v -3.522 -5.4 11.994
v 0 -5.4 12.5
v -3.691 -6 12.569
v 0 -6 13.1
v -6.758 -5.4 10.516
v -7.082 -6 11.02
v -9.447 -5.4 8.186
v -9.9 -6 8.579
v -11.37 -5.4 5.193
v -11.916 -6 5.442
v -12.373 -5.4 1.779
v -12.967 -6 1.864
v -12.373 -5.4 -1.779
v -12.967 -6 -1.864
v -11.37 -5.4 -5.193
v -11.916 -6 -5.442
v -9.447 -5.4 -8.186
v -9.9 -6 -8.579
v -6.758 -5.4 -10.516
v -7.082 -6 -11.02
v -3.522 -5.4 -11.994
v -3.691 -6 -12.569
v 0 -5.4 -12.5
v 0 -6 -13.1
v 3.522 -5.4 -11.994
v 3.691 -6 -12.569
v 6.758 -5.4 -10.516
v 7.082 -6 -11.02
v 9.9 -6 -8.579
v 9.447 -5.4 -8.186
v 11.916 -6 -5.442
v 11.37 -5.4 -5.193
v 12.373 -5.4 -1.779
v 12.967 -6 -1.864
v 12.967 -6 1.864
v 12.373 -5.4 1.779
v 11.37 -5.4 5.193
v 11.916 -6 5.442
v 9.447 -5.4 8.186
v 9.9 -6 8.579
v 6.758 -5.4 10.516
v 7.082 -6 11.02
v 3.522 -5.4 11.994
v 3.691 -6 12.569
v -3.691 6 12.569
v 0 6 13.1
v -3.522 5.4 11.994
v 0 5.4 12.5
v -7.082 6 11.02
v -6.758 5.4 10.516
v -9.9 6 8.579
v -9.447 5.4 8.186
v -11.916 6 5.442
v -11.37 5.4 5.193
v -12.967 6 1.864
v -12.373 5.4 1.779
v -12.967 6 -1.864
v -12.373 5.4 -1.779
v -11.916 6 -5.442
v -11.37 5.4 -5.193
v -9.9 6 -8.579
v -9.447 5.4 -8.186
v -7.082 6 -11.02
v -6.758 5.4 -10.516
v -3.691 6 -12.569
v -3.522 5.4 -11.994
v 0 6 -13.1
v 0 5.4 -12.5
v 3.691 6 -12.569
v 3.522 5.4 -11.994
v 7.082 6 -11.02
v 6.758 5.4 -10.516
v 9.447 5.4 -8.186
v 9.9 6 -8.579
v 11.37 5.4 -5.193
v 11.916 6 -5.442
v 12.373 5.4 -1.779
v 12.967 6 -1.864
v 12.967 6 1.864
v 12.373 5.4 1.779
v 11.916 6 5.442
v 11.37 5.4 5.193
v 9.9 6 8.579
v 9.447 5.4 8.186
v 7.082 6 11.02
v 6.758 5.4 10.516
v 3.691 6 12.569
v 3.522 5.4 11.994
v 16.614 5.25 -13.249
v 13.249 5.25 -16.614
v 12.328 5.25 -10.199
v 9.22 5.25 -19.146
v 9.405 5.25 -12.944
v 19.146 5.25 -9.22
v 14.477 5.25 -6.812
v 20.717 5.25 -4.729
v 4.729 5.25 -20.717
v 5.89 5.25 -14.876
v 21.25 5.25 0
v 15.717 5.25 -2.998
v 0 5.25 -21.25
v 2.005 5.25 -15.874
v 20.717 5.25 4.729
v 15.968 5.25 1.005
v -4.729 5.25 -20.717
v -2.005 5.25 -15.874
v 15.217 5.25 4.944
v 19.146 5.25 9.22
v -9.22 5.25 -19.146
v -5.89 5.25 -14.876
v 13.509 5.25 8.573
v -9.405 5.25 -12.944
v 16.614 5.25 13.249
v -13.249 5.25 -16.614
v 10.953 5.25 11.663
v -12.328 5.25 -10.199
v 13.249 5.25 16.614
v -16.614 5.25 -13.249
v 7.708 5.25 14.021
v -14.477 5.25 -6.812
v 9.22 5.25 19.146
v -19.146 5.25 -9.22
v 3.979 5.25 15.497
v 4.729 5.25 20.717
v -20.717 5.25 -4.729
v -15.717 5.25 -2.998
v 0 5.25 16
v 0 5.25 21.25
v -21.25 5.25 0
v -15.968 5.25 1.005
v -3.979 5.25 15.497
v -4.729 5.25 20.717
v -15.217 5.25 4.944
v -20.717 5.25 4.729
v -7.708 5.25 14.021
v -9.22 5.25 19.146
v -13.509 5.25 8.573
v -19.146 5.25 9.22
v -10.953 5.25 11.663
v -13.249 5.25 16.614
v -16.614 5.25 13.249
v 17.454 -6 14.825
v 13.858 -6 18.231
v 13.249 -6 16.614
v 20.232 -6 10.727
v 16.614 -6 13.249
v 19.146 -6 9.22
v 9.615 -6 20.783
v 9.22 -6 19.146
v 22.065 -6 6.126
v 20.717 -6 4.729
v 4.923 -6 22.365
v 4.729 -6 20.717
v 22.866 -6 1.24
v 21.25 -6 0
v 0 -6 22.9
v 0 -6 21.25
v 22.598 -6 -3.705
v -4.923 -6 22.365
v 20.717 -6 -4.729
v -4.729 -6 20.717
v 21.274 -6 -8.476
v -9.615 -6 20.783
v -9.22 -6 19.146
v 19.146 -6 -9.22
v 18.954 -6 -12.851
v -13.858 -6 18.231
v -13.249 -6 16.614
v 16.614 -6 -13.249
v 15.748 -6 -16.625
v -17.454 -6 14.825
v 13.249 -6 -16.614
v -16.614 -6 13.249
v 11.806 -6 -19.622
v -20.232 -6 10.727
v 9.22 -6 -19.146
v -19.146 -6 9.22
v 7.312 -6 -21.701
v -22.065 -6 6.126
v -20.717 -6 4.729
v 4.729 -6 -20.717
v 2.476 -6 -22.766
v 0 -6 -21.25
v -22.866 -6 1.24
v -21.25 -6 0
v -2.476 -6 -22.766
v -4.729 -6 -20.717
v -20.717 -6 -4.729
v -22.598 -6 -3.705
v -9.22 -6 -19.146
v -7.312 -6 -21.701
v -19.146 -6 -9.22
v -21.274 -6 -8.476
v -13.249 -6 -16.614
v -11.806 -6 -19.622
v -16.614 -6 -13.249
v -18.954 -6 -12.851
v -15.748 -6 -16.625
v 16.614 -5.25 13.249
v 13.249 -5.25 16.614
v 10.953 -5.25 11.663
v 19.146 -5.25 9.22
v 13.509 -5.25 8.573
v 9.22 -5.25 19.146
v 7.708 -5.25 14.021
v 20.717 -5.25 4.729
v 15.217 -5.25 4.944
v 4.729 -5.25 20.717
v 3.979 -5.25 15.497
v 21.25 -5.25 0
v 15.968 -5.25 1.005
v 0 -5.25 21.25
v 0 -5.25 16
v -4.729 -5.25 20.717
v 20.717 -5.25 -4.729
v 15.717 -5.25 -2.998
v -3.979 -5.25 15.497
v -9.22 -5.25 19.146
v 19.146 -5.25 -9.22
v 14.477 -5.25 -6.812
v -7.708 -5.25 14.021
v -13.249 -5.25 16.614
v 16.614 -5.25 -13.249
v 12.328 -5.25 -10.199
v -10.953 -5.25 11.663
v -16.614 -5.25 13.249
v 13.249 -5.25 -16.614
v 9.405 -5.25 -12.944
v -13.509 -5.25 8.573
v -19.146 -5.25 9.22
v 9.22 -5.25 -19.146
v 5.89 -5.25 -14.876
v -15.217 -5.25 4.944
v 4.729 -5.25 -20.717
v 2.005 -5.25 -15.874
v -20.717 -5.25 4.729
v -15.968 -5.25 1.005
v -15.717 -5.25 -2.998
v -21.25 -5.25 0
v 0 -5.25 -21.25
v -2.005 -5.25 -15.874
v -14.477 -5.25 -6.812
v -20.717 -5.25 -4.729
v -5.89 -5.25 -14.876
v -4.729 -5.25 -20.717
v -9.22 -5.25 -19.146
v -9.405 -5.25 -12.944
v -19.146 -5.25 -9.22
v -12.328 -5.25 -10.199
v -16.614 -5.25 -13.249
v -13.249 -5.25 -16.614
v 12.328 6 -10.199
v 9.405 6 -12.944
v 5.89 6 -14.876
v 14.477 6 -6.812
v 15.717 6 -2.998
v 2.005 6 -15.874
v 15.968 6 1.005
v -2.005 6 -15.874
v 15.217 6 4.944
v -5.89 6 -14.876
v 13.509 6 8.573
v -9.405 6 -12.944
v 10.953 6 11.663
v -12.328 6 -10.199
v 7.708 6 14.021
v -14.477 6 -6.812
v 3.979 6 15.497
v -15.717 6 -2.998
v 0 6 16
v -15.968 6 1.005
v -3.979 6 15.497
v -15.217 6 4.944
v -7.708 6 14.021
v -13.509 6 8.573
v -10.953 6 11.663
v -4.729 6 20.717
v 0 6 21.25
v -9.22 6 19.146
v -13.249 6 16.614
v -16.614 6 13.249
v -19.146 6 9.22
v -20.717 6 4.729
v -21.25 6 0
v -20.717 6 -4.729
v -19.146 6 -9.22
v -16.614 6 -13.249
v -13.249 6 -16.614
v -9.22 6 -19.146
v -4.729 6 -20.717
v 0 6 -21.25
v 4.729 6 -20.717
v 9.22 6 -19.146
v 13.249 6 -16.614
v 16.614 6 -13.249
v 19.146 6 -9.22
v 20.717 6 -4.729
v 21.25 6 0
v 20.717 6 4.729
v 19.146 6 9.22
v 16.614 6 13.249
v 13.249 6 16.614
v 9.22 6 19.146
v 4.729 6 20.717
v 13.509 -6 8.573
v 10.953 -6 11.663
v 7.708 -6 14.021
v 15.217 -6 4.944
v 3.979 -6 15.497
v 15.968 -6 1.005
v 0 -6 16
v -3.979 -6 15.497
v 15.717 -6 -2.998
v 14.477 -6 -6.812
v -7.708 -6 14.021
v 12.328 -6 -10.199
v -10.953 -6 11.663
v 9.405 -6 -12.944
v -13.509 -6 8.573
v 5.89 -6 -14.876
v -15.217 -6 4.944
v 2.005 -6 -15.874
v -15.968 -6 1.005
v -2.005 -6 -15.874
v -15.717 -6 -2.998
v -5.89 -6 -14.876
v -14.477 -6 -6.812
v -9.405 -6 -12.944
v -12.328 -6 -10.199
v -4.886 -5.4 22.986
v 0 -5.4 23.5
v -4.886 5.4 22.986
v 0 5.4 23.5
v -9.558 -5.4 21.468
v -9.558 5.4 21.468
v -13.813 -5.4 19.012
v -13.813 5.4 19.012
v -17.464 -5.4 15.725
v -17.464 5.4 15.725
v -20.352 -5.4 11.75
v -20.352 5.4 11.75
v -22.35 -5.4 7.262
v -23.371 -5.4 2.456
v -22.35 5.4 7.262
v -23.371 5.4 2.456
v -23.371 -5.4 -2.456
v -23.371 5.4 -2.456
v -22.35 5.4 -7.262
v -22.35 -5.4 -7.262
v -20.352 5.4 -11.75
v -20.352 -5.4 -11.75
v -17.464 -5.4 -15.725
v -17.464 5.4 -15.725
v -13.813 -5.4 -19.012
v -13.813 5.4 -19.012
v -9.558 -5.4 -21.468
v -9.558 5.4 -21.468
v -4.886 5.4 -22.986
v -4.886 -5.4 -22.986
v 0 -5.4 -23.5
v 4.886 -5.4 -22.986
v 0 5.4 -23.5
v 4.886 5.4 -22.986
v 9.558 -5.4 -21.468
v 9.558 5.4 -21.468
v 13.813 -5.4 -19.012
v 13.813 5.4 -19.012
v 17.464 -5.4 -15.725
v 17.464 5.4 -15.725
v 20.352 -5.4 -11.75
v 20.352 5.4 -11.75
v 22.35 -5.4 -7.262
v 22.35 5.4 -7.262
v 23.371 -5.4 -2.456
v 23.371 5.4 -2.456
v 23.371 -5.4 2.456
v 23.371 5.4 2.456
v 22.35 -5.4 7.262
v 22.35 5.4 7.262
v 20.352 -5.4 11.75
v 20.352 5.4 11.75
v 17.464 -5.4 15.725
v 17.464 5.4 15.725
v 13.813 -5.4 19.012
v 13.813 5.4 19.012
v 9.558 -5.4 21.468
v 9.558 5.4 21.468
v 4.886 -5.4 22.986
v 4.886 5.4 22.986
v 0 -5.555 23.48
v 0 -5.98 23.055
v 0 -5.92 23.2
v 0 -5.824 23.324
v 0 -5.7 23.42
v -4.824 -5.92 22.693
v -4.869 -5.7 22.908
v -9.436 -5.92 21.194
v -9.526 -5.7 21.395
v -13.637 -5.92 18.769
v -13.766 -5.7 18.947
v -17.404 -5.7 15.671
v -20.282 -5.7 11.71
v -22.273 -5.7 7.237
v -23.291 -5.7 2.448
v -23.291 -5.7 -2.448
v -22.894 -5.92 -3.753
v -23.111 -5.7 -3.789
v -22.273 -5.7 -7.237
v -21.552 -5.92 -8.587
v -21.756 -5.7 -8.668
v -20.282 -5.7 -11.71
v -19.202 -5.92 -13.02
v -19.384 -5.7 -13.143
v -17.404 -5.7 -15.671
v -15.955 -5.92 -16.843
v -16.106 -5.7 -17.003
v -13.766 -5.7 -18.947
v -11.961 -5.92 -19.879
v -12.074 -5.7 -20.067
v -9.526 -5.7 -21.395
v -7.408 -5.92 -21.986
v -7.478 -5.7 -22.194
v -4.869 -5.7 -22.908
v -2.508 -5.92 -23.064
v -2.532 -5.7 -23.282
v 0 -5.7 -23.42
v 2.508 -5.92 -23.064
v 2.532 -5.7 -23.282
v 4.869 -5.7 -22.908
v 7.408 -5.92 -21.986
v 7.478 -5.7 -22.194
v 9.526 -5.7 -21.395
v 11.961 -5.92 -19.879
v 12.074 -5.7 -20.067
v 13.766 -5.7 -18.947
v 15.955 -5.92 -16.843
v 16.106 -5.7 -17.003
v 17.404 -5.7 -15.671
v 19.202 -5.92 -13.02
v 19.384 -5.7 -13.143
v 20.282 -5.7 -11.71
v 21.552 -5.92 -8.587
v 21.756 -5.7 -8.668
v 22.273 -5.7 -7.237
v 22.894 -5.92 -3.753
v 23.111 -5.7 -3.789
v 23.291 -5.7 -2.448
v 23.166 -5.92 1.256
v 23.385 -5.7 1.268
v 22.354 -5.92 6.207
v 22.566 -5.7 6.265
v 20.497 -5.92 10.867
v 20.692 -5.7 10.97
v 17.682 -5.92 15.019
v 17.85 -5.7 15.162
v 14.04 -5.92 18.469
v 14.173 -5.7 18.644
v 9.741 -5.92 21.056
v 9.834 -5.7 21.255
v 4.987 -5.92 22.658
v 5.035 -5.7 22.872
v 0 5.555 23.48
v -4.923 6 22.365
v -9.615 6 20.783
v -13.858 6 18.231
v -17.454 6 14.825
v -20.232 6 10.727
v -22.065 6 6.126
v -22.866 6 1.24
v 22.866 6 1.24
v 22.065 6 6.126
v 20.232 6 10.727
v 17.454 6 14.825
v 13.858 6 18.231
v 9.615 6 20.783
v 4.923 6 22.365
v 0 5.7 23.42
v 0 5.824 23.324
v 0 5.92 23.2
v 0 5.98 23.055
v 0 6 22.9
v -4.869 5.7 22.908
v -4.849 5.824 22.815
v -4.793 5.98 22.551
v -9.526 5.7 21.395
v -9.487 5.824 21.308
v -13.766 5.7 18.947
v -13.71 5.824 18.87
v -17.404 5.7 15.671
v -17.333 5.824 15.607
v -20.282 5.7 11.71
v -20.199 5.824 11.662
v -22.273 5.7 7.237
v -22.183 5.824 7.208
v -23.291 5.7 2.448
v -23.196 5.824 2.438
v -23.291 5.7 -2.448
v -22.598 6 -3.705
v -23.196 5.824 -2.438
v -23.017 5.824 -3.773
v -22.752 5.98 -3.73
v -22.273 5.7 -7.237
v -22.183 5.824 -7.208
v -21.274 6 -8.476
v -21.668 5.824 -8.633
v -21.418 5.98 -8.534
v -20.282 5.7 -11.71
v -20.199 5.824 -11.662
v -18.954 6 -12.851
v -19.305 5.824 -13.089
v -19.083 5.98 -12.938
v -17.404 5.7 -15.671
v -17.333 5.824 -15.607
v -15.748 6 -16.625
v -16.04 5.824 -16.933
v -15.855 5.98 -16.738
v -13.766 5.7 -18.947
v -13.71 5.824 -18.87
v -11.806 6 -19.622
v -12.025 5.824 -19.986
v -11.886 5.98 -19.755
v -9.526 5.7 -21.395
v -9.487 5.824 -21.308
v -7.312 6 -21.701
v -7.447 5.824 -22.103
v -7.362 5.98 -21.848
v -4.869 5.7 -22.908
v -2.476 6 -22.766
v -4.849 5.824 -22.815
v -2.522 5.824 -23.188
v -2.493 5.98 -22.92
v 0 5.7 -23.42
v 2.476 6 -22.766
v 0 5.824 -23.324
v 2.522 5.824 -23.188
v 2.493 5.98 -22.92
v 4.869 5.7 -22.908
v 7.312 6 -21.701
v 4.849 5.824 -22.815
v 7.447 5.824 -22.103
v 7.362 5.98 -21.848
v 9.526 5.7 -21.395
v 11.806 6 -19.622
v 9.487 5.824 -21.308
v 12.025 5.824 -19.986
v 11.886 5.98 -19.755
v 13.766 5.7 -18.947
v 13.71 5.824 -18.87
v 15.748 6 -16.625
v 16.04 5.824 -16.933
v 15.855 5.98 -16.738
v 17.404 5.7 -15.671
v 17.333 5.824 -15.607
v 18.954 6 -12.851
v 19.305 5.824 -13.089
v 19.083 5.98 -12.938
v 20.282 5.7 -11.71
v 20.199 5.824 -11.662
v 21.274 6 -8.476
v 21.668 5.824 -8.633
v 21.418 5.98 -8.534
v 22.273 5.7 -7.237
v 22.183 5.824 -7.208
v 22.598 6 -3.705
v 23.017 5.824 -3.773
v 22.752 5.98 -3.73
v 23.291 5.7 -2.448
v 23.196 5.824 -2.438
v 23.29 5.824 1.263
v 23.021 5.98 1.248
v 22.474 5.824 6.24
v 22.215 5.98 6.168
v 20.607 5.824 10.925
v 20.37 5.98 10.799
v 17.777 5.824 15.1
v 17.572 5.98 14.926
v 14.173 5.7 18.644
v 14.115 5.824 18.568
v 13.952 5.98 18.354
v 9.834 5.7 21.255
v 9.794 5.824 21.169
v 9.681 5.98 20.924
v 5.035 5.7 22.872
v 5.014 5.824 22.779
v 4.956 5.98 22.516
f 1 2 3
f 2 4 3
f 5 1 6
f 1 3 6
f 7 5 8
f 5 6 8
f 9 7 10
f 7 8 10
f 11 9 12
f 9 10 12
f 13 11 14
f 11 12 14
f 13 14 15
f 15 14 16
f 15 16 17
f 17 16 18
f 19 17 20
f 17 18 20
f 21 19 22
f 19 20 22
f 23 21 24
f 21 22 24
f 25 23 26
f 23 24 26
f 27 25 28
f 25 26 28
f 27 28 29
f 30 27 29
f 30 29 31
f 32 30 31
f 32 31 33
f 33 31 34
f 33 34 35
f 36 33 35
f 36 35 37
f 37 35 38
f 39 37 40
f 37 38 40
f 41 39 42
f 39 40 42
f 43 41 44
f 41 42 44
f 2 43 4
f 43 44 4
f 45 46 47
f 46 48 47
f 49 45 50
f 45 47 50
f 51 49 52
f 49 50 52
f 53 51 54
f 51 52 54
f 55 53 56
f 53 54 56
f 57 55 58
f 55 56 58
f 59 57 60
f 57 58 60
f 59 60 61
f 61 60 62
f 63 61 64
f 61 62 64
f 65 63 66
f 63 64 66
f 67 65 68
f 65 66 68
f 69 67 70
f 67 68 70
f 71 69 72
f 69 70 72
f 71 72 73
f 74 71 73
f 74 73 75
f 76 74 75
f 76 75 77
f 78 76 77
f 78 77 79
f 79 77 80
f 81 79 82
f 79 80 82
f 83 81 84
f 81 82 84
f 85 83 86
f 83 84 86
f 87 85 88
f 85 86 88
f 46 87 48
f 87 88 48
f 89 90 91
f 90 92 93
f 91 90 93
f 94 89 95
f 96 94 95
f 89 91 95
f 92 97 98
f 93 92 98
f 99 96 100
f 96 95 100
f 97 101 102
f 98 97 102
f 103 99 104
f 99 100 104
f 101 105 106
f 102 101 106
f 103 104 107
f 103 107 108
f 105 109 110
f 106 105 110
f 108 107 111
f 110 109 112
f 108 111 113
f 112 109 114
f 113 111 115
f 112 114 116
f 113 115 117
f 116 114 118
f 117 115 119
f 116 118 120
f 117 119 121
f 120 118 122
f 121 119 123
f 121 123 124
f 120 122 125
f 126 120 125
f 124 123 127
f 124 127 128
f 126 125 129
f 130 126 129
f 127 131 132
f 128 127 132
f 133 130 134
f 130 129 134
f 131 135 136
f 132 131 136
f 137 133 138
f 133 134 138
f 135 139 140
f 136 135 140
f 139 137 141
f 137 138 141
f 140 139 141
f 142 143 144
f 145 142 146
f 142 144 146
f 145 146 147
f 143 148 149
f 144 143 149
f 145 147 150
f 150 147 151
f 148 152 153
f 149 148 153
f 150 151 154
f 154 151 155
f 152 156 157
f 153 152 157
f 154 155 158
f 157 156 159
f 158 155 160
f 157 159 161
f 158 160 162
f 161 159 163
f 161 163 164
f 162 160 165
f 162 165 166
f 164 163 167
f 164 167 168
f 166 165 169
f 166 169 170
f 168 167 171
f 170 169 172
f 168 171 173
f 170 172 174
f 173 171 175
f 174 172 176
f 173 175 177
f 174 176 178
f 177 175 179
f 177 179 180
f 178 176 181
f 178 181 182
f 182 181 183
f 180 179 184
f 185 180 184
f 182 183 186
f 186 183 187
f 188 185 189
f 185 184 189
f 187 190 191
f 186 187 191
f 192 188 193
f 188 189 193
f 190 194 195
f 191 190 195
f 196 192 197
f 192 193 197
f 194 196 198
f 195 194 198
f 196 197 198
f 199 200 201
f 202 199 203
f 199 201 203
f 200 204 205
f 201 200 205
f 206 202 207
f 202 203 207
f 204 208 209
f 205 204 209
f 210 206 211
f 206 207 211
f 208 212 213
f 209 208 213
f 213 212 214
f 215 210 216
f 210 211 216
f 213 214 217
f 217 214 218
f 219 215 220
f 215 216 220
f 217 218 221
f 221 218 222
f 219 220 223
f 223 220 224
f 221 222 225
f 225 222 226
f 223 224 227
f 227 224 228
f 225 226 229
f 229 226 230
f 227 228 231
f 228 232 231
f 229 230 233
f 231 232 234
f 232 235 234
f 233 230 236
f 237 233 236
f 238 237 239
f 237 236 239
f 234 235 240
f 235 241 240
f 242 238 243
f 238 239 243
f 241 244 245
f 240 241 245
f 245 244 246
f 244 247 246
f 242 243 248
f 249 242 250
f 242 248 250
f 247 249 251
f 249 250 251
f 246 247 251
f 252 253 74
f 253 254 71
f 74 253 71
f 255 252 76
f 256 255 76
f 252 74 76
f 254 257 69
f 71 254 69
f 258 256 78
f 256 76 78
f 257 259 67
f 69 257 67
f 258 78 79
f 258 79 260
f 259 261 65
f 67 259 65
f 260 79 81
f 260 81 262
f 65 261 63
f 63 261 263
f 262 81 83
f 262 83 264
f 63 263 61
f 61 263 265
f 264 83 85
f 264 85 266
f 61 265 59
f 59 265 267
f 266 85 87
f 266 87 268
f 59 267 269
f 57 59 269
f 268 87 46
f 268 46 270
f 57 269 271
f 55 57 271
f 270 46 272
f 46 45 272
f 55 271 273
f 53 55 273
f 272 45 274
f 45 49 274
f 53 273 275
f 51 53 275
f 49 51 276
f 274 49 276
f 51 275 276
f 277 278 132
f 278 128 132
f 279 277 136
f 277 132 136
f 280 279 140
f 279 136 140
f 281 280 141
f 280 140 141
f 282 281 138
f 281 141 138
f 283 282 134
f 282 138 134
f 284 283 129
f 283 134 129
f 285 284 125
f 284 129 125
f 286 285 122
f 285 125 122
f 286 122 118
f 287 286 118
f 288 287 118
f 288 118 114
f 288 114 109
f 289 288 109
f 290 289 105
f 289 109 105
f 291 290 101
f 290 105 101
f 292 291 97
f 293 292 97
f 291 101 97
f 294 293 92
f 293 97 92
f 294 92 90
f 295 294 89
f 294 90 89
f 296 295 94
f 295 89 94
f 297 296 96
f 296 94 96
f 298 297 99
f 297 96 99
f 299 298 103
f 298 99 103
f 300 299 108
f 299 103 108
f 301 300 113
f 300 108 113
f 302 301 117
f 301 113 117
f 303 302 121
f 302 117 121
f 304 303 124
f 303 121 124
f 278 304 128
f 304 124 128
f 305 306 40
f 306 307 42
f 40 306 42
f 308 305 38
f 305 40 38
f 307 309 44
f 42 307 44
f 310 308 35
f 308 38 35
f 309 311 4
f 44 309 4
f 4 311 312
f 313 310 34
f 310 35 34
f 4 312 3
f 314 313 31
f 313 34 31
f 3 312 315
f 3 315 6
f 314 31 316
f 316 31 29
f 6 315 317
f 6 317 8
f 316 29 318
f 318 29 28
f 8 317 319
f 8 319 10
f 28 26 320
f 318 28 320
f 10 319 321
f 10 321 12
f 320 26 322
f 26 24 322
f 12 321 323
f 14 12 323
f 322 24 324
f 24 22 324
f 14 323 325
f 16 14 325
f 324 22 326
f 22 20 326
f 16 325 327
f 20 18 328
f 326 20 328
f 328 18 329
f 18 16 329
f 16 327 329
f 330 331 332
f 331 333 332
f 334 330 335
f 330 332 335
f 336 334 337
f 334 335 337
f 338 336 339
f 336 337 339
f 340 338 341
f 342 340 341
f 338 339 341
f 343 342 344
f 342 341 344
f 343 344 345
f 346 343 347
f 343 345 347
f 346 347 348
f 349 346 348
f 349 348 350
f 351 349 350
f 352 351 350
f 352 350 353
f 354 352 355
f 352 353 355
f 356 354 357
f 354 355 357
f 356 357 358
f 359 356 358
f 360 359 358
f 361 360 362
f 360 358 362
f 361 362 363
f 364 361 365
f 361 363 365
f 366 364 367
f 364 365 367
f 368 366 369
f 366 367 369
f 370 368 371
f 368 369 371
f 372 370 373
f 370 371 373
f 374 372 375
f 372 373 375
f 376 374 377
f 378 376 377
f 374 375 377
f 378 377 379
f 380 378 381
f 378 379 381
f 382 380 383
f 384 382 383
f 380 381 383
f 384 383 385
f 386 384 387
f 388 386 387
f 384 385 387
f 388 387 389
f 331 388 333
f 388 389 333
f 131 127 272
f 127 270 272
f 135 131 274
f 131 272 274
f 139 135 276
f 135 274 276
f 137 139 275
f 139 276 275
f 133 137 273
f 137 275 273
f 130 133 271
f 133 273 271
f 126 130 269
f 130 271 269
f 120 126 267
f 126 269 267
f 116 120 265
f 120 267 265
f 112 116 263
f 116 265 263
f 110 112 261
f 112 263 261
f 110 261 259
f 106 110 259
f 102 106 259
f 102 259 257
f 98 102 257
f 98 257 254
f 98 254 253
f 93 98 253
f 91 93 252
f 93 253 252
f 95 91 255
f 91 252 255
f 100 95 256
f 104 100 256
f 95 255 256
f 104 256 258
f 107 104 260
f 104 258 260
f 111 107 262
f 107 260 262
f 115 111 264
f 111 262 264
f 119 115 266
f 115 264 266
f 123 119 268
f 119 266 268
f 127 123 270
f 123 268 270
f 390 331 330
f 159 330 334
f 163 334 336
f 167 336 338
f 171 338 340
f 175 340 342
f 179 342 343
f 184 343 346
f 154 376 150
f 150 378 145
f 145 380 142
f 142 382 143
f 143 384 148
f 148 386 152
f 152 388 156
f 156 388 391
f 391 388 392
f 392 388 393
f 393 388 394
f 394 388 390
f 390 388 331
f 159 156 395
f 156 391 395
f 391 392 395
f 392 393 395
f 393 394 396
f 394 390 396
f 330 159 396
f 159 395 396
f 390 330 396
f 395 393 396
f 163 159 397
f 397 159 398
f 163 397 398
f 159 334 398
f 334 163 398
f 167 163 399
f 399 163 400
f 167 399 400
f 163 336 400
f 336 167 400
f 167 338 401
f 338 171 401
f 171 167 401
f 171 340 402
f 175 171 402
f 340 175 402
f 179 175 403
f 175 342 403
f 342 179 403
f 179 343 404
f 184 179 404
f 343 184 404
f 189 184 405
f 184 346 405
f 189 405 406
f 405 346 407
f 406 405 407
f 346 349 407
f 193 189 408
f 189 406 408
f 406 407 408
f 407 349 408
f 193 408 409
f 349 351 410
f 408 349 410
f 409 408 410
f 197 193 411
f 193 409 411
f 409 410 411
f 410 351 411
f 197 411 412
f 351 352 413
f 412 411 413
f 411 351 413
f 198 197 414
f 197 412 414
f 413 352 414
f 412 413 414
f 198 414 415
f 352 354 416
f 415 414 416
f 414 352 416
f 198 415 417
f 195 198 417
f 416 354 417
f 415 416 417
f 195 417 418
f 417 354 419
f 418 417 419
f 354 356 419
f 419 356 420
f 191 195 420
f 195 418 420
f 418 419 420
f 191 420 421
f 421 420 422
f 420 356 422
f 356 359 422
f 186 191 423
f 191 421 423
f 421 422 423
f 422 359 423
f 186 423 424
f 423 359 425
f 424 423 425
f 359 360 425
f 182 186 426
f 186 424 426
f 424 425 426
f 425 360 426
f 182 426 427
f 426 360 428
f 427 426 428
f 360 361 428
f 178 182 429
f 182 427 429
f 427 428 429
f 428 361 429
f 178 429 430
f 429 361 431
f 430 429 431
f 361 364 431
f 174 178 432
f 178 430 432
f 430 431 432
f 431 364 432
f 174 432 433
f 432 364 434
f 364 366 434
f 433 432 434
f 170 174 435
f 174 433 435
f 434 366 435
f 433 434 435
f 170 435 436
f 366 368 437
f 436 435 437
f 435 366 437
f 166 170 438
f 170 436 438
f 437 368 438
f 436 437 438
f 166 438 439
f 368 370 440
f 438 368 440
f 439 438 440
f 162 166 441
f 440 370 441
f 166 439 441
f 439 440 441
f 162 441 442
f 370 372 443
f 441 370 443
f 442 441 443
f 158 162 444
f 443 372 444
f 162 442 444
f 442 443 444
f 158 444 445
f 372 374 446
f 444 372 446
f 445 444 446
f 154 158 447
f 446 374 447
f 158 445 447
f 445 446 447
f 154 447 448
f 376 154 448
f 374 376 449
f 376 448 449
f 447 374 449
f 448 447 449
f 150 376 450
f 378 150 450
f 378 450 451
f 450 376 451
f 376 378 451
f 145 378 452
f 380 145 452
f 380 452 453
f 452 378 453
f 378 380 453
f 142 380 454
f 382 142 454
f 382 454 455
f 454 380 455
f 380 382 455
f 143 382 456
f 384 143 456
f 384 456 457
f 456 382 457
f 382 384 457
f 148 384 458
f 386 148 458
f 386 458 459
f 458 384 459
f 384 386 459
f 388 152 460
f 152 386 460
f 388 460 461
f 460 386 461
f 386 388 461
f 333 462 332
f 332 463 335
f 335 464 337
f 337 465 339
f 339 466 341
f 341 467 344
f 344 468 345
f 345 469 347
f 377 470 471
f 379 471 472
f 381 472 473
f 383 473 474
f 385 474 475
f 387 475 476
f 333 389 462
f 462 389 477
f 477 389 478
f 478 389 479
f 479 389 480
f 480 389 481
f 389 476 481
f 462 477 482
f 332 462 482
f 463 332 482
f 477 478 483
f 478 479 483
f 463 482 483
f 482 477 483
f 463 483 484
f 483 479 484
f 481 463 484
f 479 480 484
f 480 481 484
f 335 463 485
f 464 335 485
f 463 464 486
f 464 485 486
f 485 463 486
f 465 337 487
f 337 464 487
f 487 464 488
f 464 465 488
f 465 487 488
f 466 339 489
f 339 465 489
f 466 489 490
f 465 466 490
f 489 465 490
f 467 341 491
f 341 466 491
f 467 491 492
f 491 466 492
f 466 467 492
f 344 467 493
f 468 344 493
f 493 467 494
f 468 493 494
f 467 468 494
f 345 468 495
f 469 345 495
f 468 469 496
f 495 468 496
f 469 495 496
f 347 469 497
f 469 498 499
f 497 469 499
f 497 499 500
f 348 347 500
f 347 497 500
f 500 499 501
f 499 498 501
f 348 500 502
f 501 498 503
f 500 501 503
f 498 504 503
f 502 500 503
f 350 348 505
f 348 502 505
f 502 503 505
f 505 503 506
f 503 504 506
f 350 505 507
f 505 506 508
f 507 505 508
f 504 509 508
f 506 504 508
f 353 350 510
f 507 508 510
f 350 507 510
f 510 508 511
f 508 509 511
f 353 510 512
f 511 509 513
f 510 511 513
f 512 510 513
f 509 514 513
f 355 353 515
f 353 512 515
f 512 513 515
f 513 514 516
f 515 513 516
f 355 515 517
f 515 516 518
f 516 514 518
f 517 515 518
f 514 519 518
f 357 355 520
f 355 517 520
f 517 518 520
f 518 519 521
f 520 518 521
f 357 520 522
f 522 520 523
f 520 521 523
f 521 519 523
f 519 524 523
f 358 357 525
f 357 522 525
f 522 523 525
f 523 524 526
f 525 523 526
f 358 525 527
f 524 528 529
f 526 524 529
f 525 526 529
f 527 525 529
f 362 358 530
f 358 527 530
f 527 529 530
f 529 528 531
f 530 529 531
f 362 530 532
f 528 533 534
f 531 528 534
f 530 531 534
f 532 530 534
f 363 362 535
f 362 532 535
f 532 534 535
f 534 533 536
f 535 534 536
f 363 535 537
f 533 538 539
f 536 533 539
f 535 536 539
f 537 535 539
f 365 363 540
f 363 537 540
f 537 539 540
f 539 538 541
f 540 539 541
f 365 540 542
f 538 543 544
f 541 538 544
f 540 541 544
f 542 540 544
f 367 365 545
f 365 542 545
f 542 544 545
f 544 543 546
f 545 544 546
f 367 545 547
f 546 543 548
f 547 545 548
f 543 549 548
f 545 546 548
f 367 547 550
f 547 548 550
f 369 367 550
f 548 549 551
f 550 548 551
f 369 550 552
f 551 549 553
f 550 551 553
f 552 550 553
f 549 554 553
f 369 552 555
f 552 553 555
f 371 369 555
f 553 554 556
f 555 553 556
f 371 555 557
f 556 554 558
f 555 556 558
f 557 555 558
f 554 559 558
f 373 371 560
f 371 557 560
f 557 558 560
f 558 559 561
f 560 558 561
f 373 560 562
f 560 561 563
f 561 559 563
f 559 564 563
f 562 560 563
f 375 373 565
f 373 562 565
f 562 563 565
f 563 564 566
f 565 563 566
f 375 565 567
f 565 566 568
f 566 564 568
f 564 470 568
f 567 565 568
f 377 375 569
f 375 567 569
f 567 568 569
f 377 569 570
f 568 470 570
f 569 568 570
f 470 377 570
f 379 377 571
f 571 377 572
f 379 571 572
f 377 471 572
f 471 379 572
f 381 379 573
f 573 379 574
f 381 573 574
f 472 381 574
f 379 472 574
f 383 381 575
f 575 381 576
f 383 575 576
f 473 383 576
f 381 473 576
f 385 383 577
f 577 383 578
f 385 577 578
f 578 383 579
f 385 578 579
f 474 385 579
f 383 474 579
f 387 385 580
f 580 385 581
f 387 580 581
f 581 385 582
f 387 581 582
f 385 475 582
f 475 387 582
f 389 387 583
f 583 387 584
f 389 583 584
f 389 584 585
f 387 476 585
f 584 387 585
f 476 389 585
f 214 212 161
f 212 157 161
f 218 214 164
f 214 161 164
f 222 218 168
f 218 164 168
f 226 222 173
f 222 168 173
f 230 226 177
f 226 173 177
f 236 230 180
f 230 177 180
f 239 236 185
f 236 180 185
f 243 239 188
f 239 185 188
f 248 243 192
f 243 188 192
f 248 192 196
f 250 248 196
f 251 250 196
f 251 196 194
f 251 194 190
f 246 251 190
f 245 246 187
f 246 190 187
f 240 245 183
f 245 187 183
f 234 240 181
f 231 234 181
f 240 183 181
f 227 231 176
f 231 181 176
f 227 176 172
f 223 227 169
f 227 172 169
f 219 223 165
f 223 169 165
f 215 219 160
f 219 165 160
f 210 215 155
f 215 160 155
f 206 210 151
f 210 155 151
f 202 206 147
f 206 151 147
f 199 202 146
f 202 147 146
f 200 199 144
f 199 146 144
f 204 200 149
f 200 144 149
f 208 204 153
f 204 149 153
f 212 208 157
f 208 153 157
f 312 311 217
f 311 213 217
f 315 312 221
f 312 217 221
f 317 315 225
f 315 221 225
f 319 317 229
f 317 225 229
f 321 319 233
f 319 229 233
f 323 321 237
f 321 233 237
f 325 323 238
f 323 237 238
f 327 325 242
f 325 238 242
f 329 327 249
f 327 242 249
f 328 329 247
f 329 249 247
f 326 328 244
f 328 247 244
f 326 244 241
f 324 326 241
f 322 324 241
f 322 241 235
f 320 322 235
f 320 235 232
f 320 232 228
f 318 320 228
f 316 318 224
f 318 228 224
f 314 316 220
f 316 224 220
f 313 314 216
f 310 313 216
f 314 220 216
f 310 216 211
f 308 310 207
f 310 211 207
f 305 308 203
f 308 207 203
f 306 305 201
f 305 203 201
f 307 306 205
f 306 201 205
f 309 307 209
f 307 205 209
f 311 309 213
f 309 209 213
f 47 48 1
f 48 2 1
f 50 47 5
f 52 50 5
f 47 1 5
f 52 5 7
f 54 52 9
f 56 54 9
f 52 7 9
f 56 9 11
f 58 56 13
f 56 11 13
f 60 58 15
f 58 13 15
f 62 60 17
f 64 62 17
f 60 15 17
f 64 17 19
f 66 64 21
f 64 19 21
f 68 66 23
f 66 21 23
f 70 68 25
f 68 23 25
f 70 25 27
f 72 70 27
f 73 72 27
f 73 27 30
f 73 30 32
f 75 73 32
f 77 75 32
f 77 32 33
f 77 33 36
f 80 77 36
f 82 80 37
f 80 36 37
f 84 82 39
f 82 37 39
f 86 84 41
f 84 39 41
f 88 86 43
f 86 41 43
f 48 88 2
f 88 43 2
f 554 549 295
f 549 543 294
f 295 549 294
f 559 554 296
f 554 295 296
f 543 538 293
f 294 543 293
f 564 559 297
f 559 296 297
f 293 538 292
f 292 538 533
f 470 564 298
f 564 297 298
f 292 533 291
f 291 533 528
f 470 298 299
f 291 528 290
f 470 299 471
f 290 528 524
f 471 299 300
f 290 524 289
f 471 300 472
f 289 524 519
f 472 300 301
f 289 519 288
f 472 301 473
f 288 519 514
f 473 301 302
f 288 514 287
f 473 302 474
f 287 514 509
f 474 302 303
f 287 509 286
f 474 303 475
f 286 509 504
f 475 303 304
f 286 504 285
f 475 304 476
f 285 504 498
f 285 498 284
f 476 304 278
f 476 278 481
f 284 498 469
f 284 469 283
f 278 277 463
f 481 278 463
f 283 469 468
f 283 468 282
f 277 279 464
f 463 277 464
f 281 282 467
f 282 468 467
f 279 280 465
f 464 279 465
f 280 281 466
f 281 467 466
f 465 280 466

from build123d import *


with BuildPart() as part:
    # Sketch1 → Revolve1 (revolve)
    with BuildSketch(Plane(origin=(0, 0, 0), x_dir=(0, 0, -1), z_dir=(1, 0, 0))):
        with BuildLine():
            Line((-13.1, 6), (-12.5, 5.4))
            Line((-12.5, 5.4), (-12.5, -5.4))
            Line((-12.5, -5.4), (-13.1, -6))
            Line((-13.1, -6), (-16, -6))
            Line((-16, -6), (-16, -5.25))
            Line((-16, -5.25), (-21.25, -5.25))
            Line((-21.25, -5.25), (-21.25, -6))
            Line((-21.25, -6), (-22.9, -6))
            ThreePointArc((-22.9, -6), (-23.324264069, -5.824264069), (-23.5, -5.4))
            Line((-23.5, -5.4), (-23.5, 5.4))
            ThreePointArc((-23.5, 5.4), (-23.324264069, 5.824264069), (-22.9, 6))
            Line((-22.9, 6), (-21.25, 6))
            Line((-21.25, 6), (-21.25, 5.25))
            Line((-21.25, 5.25), (-16, 5.25))
            Line((-16, 5.25), (-16, 6))
            Line((-16, 6), (-13.1, 6))
        make_face()
    revolve(axis=Axis((0, 26.680665717, 0), (0, -1, 0)))


solid = part.part
